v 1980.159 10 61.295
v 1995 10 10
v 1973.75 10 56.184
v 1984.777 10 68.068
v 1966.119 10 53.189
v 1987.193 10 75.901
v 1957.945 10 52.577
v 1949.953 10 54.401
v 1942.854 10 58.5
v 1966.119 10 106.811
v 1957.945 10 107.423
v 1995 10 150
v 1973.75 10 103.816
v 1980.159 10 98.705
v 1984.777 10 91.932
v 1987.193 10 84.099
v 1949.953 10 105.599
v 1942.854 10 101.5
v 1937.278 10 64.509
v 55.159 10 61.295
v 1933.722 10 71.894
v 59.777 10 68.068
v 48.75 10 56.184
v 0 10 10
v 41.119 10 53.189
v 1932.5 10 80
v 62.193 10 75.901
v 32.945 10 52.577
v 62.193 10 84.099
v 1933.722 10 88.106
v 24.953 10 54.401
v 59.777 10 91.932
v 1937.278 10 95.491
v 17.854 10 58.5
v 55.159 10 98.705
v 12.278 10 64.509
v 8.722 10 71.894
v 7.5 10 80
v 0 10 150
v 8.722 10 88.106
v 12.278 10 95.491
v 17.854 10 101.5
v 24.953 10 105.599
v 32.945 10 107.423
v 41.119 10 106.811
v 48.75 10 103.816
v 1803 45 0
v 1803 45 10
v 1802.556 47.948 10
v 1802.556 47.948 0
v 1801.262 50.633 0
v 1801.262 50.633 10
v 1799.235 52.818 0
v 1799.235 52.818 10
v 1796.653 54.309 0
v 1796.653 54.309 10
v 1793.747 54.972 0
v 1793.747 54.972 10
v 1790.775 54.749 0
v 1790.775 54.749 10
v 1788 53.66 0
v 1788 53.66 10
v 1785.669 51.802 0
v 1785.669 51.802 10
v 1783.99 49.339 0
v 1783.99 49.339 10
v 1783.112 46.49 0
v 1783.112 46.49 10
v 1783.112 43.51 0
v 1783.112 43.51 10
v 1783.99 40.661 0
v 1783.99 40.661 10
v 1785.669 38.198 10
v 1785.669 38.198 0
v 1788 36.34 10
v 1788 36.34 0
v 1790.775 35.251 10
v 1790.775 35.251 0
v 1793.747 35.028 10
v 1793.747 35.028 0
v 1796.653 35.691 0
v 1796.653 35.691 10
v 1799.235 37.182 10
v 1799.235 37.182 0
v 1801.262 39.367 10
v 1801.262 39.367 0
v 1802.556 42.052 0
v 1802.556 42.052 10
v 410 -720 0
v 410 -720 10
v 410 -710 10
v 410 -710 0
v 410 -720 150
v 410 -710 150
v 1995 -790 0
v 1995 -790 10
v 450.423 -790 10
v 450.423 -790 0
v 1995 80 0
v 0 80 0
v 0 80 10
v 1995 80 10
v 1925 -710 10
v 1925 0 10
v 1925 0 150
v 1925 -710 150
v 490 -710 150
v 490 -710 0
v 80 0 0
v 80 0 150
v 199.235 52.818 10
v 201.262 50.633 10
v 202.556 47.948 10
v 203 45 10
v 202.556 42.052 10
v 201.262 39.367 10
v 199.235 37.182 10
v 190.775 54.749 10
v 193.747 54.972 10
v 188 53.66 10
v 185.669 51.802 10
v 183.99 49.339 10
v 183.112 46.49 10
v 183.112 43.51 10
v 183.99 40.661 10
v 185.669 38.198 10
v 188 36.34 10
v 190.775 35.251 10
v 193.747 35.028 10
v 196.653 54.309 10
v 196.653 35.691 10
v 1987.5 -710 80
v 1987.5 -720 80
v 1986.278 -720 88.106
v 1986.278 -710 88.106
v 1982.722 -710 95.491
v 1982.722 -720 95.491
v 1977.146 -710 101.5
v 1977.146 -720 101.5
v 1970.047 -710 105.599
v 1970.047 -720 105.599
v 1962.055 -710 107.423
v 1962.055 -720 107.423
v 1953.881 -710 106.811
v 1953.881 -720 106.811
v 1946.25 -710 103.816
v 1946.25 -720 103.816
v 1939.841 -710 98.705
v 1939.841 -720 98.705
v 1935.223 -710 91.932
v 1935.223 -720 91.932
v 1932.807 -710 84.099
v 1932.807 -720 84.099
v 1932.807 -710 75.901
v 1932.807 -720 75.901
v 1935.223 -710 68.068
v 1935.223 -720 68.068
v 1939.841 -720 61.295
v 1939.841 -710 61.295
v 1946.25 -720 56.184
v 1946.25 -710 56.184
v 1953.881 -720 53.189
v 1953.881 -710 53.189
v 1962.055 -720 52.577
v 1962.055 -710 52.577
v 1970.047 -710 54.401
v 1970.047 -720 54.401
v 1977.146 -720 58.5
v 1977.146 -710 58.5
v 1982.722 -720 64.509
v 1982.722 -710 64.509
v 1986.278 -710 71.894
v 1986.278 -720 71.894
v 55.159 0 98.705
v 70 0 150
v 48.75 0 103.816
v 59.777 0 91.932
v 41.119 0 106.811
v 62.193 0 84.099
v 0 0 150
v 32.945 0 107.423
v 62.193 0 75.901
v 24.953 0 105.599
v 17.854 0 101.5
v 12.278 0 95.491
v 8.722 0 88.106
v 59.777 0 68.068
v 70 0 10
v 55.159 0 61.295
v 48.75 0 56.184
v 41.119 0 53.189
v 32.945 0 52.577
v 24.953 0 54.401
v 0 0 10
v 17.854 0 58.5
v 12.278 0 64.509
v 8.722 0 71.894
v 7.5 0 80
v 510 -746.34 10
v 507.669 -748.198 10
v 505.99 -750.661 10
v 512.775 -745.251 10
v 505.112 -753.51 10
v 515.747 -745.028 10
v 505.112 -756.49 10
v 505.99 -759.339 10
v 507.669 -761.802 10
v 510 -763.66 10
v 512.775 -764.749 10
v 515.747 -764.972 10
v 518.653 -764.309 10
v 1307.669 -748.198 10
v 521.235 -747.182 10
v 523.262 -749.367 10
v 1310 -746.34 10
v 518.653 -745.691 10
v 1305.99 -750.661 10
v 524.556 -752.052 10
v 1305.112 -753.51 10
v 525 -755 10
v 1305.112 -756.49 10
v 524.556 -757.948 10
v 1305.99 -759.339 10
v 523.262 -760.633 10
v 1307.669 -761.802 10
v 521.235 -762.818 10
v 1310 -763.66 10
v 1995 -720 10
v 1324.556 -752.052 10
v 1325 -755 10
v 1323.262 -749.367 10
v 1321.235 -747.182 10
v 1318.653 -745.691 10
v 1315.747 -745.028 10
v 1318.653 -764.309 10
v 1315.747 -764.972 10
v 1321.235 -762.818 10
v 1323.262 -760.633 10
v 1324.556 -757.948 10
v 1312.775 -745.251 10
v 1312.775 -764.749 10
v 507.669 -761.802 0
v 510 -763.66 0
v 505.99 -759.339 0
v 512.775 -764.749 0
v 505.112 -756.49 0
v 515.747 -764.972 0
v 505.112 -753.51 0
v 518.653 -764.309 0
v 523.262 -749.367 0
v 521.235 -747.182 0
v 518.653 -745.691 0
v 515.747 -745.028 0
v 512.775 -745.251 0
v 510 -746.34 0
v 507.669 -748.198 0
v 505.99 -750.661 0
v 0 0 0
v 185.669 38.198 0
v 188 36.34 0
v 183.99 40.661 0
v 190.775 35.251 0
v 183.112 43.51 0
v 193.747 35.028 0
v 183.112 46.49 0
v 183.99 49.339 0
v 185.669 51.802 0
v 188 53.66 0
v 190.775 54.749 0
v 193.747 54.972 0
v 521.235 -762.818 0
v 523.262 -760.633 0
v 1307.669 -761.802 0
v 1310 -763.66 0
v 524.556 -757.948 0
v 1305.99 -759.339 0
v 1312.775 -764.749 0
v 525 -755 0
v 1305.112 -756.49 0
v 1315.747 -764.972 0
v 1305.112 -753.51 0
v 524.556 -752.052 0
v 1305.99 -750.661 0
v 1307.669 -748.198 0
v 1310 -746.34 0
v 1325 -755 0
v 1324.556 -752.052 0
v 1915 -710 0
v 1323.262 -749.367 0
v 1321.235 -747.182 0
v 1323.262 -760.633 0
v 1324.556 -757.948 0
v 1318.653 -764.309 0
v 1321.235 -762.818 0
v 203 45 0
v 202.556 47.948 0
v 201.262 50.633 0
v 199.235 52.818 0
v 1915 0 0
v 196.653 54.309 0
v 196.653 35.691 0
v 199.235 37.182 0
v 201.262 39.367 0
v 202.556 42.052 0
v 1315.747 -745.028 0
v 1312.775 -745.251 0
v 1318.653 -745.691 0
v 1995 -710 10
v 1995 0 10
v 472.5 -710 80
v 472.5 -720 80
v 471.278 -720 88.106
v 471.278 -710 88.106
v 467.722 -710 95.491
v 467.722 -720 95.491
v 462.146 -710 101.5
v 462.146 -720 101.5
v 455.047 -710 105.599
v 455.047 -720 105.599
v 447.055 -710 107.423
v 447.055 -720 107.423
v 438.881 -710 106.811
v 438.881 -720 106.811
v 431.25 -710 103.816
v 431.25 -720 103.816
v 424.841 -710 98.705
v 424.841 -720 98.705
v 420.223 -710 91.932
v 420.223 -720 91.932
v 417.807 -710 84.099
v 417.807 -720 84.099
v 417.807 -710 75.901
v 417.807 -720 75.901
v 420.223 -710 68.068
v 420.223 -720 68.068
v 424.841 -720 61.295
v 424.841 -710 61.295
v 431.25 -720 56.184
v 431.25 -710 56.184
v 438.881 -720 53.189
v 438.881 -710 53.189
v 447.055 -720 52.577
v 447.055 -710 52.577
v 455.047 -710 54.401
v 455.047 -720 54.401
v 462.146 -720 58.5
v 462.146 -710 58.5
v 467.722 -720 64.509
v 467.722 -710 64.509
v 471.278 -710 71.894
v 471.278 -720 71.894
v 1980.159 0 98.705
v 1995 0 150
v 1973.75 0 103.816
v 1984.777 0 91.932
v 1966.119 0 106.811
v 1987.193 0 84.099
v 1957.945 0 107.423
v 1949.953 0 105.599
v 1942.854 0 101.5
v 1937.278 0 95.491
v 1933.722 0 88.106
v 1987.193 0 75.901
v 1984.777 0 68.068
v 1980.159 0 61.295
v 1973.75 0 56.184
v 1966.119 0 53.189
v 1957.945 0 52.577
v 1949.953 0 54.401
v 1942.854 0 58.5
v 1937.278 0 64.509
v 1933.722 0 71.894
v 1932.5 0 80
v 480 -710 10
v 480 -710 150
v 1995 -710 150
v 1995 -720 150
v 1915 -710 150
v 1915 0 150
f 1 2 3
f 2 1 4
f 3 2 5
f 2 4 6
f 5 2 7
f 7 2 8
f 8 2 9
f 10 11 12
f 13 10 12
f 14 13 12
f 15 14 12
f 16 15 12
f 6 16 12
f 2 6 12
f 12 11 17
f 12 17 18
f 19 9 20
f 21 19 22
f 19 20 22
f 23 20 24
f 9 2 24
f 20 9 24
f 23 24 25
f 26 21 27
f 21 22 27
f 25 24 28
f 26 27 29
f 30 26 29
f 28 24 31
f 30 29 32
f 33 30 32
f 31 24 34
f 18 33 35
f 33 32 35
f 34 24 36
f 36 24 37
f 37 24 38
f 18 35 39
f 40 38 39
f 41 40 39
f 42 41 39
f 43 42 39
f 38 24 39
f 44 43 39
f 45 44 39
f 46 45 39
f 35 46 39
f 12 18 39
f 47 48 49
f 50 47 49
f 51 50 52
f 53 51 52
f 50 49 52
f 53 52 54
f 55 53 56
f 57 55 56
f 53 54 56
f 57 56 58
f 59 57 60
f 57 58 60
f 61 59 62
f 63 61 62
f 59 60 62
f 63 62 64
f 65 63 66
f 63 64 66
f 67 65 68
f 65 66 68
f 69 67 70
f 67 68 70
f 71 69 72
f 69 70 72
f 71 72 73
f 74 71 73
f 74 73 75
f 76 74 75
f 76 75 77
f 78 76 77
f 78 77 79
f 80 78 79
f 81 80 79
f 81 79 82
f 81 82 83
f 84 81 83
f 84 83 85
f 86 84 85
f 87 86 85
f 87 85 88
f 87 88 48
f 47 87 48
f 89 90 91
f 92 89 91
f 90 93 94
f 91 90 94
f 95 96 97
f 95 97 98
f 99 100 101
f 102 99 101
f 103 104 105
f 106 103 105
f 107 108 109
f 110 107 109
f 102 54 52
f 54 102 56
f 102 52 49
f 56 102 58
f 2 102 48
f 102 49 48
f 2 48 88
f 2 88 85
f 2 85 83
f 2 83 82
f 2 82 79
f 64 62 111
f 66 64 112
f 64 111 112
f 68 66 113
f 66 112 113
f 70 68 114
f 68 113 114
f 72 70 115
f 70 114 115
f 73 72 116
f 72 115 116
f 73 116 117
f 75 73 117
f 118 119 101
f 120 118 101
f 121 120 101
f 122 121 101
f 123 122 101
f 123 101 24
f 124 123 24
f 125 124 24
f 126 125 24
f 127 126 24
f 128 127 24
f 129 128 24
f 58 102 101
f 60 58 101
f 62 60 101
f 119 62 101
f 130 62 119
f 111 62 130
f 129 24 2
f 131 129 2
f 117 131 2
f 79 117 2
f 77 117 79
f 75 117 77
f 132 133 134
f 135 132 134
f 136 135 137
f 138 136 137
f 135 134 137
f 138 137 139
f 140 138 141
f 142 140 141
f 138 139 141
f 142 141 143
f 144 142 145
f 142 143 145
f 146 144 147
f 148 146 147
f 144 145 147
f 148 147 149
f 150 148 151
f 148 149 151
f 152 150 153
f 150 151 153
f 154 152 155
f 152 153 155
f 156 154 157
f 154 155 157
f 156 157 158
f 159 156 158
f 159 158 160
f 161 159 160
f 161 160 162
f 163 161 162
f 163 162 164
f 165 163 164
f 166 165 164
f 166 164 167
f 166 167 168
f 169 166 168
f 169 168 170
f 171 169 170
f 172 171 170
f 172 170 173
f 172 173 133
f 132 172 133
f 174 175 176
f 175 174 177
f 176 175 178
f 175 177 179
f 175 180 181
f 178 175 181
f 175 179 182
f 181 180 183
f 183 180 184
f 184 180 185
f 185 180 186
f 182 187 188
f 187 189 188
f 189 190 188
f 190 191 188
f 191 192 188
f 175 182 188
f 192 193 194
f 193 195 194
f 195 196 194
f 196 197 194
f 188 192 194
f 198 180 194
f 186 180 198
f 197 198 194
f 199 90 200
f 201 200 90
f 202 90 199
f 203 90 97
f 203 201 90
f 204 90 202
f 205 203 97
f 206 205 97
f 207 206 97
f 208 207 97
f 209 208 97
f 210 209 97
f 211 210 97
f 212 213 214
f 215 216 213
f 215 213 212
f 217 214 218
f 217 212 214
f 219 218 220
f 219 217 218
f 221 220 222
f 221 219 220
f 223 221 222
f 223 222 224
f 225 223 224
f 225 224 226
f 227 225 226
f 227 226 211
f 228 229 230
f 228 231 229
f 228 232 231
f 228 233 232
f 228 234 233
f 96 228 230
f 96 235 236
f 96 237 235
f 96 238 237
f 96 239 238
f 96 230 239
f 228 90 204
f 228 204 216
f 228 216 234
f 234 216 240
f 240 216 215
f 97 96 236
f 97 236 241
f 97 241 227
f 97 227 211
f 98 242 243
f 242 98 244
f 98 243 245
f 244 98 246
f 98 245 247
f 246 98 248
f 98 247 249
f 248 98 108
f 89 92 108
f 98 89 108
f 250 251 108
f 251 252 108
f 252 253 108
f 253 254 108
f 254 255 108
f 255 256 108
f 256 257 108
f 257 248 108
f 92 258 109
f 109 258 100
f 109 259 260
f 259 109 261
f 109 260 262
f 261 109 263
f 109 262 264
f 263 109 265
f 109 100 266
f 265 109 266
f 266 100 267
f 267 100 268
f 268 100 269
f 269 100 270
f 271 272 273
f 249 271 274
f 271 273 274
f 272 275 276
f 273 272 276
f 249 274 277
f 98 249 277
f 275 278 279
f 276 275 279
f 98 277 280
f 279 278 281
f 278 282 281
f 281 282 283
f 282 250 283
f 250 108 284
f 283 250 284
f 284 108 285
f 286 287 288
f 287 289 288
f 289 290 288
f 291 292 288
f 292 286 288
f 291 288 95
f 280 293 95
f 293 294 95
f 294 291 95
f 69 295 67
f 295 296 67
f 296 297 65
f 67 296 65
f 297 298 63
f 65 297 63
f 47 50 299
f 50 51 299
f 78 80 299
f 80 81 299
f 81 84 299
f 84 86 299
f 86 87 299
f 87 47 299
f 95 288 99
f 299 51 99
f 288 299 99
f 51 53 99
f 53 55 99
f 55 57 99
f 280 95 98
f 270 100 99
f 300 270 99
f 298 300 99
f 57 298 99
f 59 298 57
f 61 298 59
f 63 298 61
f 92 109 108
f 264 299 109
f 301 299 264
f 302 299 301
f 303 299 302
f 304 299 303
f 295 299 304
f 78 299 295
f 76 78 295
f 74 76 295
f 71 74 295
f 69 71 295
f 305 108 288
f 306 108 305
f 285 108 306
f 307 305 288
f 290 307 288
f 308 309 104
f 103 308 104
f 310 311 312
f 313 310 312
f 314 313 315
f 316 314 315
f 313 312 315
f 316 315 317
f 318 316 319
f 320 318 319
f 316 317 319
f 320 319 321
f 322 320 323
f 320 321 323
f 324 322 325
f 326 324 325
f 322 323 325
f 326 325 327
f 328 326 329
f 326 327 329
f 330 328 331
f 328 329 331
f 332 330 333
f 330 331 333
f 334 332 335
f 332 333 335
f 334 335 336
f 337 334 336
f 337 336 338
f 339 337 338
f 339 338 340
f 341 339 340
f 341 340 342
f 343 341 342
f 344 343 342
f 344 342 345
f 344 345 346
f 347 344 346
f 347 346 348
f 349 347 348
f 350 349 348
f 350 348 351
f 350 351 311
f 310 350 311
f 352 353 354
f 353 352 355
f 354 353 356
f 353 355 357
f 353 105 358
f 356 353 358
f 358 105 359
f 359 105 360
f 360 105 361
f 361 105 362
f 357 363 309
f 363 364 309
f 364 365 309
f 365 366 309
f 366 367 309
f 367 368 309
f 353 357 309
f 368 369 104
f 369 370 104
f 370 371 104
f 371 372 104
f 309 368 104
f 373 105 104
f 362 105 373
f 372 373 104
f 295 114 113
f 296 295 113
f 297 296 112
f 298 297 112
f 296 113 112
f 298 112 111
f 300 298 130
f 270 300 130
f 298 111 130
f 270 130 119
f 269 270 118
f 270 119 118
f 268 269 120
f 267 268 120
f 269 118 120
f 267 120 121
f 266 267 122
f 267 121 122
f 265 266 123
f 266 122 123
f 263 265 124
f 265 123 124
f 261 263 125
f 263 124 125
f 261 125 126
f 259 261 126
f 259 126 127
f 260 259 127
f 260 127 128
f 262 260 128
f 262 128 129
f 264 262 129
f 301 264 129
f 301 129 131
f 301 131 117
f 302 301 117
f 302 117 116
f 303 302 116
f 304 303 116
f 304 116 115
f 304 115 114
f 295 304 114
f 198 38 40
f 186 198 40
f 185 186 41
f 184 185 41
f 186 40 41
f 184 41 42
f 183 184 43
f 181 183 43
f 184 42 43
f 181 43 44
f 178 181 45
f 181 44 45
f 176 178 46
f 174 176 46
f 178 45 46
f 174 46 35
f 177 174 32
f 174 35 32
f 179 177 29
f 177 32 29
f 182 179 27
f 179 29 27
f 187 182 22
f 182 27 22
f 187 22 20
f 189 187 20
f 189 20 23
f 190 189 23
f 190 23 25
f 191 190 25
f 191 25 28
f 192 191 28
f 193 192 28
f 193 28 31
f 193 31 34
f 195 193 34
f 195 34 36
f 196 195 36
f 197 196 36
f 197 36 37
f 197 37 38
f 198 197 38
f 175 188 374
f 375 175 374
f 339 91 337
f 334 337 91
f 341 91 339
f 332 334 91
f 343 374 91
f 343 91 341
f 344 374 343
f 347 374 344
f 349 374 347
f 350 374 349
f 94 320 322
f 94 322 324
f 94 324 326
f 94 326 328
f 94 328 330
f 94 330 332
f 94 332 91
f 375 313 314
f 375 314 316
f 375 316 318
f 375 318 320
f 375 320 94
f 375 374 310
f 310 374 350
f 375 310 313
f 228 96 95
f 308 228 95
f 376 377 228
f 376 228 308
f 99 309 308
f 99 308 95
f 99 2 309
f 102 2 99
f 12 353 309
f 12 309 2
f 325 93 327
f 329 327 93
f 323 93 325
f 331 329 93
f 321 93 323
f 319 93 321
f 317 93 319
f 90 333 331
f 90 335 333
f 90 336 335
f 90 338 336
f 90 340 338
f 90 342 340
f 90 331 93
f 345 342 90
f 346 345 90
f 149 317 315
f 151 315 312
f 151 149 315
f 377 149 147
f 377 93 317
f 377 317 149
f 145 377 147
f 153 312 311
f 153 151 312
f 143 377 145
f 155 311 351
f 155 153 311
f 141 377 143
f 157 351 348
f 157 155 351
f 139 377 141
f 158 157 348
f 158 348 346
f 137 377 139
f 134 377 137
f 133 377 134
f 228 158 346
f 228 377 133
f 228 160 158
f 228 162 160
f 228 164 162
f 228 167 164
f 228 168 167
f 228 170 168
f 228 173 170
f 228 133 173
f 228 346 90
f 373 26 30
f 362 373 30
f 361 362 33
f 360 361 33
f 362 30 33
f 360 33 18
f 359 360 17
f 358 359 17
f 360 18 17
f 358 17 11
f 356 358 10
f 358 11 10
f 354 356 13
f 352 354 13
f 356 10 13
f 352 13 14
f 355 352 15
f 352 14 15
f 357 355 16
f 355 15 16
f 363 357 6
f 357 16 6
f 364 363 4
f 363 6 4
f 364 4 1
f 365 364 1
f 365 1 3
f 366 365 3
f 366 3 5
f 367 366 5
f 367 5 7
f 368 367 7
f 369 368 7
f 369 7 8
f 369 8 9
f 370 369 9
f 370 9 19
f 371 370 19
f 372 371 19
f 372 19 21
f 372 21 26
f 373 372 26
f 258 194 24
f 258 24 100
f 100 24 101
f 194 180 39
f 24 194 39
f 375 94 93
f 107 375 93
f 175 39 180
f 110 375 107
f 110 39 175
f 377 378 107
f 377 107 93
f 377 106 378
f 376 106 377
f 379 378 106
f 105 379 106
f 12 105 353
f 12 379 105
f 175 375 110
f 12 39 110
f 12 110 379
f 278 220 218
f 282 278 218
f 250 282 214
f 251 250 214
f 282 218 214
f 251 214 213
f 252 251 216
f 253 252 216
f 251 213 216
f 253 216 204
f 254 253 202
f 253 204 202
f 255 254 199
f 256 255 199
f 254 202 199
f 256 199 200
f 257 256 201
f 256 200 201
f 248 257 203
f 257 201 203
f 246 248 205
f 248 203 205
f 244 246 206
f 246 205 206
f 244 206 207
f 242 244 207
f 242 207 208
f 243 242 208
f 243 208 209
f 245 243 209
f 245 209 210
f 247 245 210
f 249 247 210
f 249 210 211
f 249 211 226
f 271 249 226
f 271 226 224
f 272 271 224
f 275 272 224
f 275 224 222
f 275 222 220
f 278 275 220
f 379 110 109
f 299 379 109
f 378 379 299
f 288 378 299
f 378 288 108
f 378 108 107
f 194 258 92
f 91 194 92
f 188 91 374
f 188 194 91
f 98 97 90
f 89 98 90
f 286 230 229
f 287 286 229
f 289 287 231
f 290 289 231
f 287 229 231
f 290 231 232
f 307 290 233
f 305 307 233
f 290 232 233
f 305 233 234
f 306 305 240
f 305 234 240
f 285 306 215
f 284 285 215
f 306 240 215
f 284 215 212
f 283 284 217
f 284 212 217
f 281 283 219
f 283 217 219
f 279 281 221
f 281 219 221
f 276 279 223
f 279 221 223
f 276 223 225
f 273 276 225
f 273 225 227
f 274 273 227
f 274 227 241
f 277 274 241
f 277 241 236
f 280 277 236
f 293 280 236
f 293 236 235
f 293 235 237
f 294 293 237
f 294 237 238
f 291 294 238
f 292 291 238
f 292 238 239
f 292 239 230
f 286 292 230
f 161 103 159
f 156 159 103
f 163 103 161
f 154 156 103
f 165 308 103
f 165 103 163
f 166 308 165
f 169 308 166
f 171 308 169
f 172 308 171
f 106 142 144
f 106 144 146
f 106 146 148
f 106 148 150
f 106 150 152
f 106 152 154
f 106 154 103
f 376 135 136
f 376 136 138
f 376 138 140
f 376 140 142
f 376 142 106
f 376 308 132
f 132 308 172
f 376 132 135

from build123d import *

# Parameters (mm, degrees)
F1_DEPTH  = 1995
F3_DEPTH  = 710
F5_DEPTH  = 1585
F7_DEPTH  = 10
F9_DEPTH  = 140
F10_R     = 10
F11_DEPTH = 25
F12_R     = 27.5
F13_DEPTH = 15
F14_R     = 27.5
F15_DEPTH = 25
F17_DEPTH = 25


with BuildPart() as f1:
    # F0 (on Right) → F1 (new body)
    with BuildSketch(Plane.YZ):
        Polygon((0, 10), (0, 0), (10, 0), (80, 0), (80, 10), (10, 10), (10, 150), (0, 150), align=None)
    extrude(amount=F1_DEPTH)

    # F2 (on face) → F3 (join)
    with BuildSketch(Plane.XZ):
        Polygon((1915, 10), (1915, 0), (1925, 0), (1995, 0), (1995, 10), (1925, 10), (1925, 150), (1915, 150), align=None)
    extrude(amount=F3_DEPTH)



with BuildPart() as f5:
    # F4 (on face) → F5 (new body)
    with BuildSketch(Plane.YZ.offset(1995)):
        Polygon((-720, 150), (-720, 10), (-790, 10), (-790, 0), (-720, 0), (-710, 0), (-710, 10), (-710, 150), align=None)
    extrude(amount=-F5_DEPTH)


with BuildPart() as f7:
    # F6 (on Top) → F7 (new body)
    with BuildSketch(Plane.XY):
        Polygon((490, -710), (80, 0), (0, 0), (410, -710), align=None)
    extrude(amount=F7_DEPTH)


with BuildPart() as f1_1:
    add(f1.part)

    add(f5.part)  # F9 merges F5

    add(f7.part)  # F9 merges F7
    # F8 (on face) → F9 (join)
    with BuildSketch(Plane.XY.offset(10)):
        Polygon((490, -710), (80, 0), (70, 0), (480, -710), align=None)
    extrude(amount=F9_DEPTH)

    # F10 (on face) → F11 (cut)
    with BuildSketch(Plane.XY.offset(10)):
        with Locations((515, -755)):
            Circle(F10_R)
        with Locations((1315, -755)):
            Circle(F10_R)
        with Locations((1793, 45)):
            Circle(F10_R)
        with Locations((193, 45)):
            Circle(F10_R)
    extrude(amount=-F11_DEPTH, mode=Mode.SUBTRACT)

    # F12 (on face) → F13 (cut)
    with BuildSketch(Plane.XZ.offset(720)):
        with Locations((445, 80)):
            Circle(F12_R)
        with Locations((1960, 80)):
            Circle(F12_R)
    extrude(amount=-F13_DEPTH, mode=Mode.SUBTRACT)

    # F14 (on face) → F15 (cut)
    with BuildSketch(Plane(origin=(0, 10, 0), x_dir=(-1, 0, 0), z_dir=(0, 1, 0))):
        with Locations((-1960, 80)):
            Circle(F14_R)
        with Locations((-35, 80)):
            Circle(F14_R)
    extrude(amount=-F15_DEPTH, mode=Mode.SUBTRACT)

    # F16 (on face) → F17 (cut)
    with BuildSketch(Plane.XY.offset(10)):
        Polygon((450.422535, -790), (410, -720), (410, -790), align=None)
    extrude(amount=-F17_DEPTH, mode=Mode.SUBTRACT)


solid = f1_1.part
